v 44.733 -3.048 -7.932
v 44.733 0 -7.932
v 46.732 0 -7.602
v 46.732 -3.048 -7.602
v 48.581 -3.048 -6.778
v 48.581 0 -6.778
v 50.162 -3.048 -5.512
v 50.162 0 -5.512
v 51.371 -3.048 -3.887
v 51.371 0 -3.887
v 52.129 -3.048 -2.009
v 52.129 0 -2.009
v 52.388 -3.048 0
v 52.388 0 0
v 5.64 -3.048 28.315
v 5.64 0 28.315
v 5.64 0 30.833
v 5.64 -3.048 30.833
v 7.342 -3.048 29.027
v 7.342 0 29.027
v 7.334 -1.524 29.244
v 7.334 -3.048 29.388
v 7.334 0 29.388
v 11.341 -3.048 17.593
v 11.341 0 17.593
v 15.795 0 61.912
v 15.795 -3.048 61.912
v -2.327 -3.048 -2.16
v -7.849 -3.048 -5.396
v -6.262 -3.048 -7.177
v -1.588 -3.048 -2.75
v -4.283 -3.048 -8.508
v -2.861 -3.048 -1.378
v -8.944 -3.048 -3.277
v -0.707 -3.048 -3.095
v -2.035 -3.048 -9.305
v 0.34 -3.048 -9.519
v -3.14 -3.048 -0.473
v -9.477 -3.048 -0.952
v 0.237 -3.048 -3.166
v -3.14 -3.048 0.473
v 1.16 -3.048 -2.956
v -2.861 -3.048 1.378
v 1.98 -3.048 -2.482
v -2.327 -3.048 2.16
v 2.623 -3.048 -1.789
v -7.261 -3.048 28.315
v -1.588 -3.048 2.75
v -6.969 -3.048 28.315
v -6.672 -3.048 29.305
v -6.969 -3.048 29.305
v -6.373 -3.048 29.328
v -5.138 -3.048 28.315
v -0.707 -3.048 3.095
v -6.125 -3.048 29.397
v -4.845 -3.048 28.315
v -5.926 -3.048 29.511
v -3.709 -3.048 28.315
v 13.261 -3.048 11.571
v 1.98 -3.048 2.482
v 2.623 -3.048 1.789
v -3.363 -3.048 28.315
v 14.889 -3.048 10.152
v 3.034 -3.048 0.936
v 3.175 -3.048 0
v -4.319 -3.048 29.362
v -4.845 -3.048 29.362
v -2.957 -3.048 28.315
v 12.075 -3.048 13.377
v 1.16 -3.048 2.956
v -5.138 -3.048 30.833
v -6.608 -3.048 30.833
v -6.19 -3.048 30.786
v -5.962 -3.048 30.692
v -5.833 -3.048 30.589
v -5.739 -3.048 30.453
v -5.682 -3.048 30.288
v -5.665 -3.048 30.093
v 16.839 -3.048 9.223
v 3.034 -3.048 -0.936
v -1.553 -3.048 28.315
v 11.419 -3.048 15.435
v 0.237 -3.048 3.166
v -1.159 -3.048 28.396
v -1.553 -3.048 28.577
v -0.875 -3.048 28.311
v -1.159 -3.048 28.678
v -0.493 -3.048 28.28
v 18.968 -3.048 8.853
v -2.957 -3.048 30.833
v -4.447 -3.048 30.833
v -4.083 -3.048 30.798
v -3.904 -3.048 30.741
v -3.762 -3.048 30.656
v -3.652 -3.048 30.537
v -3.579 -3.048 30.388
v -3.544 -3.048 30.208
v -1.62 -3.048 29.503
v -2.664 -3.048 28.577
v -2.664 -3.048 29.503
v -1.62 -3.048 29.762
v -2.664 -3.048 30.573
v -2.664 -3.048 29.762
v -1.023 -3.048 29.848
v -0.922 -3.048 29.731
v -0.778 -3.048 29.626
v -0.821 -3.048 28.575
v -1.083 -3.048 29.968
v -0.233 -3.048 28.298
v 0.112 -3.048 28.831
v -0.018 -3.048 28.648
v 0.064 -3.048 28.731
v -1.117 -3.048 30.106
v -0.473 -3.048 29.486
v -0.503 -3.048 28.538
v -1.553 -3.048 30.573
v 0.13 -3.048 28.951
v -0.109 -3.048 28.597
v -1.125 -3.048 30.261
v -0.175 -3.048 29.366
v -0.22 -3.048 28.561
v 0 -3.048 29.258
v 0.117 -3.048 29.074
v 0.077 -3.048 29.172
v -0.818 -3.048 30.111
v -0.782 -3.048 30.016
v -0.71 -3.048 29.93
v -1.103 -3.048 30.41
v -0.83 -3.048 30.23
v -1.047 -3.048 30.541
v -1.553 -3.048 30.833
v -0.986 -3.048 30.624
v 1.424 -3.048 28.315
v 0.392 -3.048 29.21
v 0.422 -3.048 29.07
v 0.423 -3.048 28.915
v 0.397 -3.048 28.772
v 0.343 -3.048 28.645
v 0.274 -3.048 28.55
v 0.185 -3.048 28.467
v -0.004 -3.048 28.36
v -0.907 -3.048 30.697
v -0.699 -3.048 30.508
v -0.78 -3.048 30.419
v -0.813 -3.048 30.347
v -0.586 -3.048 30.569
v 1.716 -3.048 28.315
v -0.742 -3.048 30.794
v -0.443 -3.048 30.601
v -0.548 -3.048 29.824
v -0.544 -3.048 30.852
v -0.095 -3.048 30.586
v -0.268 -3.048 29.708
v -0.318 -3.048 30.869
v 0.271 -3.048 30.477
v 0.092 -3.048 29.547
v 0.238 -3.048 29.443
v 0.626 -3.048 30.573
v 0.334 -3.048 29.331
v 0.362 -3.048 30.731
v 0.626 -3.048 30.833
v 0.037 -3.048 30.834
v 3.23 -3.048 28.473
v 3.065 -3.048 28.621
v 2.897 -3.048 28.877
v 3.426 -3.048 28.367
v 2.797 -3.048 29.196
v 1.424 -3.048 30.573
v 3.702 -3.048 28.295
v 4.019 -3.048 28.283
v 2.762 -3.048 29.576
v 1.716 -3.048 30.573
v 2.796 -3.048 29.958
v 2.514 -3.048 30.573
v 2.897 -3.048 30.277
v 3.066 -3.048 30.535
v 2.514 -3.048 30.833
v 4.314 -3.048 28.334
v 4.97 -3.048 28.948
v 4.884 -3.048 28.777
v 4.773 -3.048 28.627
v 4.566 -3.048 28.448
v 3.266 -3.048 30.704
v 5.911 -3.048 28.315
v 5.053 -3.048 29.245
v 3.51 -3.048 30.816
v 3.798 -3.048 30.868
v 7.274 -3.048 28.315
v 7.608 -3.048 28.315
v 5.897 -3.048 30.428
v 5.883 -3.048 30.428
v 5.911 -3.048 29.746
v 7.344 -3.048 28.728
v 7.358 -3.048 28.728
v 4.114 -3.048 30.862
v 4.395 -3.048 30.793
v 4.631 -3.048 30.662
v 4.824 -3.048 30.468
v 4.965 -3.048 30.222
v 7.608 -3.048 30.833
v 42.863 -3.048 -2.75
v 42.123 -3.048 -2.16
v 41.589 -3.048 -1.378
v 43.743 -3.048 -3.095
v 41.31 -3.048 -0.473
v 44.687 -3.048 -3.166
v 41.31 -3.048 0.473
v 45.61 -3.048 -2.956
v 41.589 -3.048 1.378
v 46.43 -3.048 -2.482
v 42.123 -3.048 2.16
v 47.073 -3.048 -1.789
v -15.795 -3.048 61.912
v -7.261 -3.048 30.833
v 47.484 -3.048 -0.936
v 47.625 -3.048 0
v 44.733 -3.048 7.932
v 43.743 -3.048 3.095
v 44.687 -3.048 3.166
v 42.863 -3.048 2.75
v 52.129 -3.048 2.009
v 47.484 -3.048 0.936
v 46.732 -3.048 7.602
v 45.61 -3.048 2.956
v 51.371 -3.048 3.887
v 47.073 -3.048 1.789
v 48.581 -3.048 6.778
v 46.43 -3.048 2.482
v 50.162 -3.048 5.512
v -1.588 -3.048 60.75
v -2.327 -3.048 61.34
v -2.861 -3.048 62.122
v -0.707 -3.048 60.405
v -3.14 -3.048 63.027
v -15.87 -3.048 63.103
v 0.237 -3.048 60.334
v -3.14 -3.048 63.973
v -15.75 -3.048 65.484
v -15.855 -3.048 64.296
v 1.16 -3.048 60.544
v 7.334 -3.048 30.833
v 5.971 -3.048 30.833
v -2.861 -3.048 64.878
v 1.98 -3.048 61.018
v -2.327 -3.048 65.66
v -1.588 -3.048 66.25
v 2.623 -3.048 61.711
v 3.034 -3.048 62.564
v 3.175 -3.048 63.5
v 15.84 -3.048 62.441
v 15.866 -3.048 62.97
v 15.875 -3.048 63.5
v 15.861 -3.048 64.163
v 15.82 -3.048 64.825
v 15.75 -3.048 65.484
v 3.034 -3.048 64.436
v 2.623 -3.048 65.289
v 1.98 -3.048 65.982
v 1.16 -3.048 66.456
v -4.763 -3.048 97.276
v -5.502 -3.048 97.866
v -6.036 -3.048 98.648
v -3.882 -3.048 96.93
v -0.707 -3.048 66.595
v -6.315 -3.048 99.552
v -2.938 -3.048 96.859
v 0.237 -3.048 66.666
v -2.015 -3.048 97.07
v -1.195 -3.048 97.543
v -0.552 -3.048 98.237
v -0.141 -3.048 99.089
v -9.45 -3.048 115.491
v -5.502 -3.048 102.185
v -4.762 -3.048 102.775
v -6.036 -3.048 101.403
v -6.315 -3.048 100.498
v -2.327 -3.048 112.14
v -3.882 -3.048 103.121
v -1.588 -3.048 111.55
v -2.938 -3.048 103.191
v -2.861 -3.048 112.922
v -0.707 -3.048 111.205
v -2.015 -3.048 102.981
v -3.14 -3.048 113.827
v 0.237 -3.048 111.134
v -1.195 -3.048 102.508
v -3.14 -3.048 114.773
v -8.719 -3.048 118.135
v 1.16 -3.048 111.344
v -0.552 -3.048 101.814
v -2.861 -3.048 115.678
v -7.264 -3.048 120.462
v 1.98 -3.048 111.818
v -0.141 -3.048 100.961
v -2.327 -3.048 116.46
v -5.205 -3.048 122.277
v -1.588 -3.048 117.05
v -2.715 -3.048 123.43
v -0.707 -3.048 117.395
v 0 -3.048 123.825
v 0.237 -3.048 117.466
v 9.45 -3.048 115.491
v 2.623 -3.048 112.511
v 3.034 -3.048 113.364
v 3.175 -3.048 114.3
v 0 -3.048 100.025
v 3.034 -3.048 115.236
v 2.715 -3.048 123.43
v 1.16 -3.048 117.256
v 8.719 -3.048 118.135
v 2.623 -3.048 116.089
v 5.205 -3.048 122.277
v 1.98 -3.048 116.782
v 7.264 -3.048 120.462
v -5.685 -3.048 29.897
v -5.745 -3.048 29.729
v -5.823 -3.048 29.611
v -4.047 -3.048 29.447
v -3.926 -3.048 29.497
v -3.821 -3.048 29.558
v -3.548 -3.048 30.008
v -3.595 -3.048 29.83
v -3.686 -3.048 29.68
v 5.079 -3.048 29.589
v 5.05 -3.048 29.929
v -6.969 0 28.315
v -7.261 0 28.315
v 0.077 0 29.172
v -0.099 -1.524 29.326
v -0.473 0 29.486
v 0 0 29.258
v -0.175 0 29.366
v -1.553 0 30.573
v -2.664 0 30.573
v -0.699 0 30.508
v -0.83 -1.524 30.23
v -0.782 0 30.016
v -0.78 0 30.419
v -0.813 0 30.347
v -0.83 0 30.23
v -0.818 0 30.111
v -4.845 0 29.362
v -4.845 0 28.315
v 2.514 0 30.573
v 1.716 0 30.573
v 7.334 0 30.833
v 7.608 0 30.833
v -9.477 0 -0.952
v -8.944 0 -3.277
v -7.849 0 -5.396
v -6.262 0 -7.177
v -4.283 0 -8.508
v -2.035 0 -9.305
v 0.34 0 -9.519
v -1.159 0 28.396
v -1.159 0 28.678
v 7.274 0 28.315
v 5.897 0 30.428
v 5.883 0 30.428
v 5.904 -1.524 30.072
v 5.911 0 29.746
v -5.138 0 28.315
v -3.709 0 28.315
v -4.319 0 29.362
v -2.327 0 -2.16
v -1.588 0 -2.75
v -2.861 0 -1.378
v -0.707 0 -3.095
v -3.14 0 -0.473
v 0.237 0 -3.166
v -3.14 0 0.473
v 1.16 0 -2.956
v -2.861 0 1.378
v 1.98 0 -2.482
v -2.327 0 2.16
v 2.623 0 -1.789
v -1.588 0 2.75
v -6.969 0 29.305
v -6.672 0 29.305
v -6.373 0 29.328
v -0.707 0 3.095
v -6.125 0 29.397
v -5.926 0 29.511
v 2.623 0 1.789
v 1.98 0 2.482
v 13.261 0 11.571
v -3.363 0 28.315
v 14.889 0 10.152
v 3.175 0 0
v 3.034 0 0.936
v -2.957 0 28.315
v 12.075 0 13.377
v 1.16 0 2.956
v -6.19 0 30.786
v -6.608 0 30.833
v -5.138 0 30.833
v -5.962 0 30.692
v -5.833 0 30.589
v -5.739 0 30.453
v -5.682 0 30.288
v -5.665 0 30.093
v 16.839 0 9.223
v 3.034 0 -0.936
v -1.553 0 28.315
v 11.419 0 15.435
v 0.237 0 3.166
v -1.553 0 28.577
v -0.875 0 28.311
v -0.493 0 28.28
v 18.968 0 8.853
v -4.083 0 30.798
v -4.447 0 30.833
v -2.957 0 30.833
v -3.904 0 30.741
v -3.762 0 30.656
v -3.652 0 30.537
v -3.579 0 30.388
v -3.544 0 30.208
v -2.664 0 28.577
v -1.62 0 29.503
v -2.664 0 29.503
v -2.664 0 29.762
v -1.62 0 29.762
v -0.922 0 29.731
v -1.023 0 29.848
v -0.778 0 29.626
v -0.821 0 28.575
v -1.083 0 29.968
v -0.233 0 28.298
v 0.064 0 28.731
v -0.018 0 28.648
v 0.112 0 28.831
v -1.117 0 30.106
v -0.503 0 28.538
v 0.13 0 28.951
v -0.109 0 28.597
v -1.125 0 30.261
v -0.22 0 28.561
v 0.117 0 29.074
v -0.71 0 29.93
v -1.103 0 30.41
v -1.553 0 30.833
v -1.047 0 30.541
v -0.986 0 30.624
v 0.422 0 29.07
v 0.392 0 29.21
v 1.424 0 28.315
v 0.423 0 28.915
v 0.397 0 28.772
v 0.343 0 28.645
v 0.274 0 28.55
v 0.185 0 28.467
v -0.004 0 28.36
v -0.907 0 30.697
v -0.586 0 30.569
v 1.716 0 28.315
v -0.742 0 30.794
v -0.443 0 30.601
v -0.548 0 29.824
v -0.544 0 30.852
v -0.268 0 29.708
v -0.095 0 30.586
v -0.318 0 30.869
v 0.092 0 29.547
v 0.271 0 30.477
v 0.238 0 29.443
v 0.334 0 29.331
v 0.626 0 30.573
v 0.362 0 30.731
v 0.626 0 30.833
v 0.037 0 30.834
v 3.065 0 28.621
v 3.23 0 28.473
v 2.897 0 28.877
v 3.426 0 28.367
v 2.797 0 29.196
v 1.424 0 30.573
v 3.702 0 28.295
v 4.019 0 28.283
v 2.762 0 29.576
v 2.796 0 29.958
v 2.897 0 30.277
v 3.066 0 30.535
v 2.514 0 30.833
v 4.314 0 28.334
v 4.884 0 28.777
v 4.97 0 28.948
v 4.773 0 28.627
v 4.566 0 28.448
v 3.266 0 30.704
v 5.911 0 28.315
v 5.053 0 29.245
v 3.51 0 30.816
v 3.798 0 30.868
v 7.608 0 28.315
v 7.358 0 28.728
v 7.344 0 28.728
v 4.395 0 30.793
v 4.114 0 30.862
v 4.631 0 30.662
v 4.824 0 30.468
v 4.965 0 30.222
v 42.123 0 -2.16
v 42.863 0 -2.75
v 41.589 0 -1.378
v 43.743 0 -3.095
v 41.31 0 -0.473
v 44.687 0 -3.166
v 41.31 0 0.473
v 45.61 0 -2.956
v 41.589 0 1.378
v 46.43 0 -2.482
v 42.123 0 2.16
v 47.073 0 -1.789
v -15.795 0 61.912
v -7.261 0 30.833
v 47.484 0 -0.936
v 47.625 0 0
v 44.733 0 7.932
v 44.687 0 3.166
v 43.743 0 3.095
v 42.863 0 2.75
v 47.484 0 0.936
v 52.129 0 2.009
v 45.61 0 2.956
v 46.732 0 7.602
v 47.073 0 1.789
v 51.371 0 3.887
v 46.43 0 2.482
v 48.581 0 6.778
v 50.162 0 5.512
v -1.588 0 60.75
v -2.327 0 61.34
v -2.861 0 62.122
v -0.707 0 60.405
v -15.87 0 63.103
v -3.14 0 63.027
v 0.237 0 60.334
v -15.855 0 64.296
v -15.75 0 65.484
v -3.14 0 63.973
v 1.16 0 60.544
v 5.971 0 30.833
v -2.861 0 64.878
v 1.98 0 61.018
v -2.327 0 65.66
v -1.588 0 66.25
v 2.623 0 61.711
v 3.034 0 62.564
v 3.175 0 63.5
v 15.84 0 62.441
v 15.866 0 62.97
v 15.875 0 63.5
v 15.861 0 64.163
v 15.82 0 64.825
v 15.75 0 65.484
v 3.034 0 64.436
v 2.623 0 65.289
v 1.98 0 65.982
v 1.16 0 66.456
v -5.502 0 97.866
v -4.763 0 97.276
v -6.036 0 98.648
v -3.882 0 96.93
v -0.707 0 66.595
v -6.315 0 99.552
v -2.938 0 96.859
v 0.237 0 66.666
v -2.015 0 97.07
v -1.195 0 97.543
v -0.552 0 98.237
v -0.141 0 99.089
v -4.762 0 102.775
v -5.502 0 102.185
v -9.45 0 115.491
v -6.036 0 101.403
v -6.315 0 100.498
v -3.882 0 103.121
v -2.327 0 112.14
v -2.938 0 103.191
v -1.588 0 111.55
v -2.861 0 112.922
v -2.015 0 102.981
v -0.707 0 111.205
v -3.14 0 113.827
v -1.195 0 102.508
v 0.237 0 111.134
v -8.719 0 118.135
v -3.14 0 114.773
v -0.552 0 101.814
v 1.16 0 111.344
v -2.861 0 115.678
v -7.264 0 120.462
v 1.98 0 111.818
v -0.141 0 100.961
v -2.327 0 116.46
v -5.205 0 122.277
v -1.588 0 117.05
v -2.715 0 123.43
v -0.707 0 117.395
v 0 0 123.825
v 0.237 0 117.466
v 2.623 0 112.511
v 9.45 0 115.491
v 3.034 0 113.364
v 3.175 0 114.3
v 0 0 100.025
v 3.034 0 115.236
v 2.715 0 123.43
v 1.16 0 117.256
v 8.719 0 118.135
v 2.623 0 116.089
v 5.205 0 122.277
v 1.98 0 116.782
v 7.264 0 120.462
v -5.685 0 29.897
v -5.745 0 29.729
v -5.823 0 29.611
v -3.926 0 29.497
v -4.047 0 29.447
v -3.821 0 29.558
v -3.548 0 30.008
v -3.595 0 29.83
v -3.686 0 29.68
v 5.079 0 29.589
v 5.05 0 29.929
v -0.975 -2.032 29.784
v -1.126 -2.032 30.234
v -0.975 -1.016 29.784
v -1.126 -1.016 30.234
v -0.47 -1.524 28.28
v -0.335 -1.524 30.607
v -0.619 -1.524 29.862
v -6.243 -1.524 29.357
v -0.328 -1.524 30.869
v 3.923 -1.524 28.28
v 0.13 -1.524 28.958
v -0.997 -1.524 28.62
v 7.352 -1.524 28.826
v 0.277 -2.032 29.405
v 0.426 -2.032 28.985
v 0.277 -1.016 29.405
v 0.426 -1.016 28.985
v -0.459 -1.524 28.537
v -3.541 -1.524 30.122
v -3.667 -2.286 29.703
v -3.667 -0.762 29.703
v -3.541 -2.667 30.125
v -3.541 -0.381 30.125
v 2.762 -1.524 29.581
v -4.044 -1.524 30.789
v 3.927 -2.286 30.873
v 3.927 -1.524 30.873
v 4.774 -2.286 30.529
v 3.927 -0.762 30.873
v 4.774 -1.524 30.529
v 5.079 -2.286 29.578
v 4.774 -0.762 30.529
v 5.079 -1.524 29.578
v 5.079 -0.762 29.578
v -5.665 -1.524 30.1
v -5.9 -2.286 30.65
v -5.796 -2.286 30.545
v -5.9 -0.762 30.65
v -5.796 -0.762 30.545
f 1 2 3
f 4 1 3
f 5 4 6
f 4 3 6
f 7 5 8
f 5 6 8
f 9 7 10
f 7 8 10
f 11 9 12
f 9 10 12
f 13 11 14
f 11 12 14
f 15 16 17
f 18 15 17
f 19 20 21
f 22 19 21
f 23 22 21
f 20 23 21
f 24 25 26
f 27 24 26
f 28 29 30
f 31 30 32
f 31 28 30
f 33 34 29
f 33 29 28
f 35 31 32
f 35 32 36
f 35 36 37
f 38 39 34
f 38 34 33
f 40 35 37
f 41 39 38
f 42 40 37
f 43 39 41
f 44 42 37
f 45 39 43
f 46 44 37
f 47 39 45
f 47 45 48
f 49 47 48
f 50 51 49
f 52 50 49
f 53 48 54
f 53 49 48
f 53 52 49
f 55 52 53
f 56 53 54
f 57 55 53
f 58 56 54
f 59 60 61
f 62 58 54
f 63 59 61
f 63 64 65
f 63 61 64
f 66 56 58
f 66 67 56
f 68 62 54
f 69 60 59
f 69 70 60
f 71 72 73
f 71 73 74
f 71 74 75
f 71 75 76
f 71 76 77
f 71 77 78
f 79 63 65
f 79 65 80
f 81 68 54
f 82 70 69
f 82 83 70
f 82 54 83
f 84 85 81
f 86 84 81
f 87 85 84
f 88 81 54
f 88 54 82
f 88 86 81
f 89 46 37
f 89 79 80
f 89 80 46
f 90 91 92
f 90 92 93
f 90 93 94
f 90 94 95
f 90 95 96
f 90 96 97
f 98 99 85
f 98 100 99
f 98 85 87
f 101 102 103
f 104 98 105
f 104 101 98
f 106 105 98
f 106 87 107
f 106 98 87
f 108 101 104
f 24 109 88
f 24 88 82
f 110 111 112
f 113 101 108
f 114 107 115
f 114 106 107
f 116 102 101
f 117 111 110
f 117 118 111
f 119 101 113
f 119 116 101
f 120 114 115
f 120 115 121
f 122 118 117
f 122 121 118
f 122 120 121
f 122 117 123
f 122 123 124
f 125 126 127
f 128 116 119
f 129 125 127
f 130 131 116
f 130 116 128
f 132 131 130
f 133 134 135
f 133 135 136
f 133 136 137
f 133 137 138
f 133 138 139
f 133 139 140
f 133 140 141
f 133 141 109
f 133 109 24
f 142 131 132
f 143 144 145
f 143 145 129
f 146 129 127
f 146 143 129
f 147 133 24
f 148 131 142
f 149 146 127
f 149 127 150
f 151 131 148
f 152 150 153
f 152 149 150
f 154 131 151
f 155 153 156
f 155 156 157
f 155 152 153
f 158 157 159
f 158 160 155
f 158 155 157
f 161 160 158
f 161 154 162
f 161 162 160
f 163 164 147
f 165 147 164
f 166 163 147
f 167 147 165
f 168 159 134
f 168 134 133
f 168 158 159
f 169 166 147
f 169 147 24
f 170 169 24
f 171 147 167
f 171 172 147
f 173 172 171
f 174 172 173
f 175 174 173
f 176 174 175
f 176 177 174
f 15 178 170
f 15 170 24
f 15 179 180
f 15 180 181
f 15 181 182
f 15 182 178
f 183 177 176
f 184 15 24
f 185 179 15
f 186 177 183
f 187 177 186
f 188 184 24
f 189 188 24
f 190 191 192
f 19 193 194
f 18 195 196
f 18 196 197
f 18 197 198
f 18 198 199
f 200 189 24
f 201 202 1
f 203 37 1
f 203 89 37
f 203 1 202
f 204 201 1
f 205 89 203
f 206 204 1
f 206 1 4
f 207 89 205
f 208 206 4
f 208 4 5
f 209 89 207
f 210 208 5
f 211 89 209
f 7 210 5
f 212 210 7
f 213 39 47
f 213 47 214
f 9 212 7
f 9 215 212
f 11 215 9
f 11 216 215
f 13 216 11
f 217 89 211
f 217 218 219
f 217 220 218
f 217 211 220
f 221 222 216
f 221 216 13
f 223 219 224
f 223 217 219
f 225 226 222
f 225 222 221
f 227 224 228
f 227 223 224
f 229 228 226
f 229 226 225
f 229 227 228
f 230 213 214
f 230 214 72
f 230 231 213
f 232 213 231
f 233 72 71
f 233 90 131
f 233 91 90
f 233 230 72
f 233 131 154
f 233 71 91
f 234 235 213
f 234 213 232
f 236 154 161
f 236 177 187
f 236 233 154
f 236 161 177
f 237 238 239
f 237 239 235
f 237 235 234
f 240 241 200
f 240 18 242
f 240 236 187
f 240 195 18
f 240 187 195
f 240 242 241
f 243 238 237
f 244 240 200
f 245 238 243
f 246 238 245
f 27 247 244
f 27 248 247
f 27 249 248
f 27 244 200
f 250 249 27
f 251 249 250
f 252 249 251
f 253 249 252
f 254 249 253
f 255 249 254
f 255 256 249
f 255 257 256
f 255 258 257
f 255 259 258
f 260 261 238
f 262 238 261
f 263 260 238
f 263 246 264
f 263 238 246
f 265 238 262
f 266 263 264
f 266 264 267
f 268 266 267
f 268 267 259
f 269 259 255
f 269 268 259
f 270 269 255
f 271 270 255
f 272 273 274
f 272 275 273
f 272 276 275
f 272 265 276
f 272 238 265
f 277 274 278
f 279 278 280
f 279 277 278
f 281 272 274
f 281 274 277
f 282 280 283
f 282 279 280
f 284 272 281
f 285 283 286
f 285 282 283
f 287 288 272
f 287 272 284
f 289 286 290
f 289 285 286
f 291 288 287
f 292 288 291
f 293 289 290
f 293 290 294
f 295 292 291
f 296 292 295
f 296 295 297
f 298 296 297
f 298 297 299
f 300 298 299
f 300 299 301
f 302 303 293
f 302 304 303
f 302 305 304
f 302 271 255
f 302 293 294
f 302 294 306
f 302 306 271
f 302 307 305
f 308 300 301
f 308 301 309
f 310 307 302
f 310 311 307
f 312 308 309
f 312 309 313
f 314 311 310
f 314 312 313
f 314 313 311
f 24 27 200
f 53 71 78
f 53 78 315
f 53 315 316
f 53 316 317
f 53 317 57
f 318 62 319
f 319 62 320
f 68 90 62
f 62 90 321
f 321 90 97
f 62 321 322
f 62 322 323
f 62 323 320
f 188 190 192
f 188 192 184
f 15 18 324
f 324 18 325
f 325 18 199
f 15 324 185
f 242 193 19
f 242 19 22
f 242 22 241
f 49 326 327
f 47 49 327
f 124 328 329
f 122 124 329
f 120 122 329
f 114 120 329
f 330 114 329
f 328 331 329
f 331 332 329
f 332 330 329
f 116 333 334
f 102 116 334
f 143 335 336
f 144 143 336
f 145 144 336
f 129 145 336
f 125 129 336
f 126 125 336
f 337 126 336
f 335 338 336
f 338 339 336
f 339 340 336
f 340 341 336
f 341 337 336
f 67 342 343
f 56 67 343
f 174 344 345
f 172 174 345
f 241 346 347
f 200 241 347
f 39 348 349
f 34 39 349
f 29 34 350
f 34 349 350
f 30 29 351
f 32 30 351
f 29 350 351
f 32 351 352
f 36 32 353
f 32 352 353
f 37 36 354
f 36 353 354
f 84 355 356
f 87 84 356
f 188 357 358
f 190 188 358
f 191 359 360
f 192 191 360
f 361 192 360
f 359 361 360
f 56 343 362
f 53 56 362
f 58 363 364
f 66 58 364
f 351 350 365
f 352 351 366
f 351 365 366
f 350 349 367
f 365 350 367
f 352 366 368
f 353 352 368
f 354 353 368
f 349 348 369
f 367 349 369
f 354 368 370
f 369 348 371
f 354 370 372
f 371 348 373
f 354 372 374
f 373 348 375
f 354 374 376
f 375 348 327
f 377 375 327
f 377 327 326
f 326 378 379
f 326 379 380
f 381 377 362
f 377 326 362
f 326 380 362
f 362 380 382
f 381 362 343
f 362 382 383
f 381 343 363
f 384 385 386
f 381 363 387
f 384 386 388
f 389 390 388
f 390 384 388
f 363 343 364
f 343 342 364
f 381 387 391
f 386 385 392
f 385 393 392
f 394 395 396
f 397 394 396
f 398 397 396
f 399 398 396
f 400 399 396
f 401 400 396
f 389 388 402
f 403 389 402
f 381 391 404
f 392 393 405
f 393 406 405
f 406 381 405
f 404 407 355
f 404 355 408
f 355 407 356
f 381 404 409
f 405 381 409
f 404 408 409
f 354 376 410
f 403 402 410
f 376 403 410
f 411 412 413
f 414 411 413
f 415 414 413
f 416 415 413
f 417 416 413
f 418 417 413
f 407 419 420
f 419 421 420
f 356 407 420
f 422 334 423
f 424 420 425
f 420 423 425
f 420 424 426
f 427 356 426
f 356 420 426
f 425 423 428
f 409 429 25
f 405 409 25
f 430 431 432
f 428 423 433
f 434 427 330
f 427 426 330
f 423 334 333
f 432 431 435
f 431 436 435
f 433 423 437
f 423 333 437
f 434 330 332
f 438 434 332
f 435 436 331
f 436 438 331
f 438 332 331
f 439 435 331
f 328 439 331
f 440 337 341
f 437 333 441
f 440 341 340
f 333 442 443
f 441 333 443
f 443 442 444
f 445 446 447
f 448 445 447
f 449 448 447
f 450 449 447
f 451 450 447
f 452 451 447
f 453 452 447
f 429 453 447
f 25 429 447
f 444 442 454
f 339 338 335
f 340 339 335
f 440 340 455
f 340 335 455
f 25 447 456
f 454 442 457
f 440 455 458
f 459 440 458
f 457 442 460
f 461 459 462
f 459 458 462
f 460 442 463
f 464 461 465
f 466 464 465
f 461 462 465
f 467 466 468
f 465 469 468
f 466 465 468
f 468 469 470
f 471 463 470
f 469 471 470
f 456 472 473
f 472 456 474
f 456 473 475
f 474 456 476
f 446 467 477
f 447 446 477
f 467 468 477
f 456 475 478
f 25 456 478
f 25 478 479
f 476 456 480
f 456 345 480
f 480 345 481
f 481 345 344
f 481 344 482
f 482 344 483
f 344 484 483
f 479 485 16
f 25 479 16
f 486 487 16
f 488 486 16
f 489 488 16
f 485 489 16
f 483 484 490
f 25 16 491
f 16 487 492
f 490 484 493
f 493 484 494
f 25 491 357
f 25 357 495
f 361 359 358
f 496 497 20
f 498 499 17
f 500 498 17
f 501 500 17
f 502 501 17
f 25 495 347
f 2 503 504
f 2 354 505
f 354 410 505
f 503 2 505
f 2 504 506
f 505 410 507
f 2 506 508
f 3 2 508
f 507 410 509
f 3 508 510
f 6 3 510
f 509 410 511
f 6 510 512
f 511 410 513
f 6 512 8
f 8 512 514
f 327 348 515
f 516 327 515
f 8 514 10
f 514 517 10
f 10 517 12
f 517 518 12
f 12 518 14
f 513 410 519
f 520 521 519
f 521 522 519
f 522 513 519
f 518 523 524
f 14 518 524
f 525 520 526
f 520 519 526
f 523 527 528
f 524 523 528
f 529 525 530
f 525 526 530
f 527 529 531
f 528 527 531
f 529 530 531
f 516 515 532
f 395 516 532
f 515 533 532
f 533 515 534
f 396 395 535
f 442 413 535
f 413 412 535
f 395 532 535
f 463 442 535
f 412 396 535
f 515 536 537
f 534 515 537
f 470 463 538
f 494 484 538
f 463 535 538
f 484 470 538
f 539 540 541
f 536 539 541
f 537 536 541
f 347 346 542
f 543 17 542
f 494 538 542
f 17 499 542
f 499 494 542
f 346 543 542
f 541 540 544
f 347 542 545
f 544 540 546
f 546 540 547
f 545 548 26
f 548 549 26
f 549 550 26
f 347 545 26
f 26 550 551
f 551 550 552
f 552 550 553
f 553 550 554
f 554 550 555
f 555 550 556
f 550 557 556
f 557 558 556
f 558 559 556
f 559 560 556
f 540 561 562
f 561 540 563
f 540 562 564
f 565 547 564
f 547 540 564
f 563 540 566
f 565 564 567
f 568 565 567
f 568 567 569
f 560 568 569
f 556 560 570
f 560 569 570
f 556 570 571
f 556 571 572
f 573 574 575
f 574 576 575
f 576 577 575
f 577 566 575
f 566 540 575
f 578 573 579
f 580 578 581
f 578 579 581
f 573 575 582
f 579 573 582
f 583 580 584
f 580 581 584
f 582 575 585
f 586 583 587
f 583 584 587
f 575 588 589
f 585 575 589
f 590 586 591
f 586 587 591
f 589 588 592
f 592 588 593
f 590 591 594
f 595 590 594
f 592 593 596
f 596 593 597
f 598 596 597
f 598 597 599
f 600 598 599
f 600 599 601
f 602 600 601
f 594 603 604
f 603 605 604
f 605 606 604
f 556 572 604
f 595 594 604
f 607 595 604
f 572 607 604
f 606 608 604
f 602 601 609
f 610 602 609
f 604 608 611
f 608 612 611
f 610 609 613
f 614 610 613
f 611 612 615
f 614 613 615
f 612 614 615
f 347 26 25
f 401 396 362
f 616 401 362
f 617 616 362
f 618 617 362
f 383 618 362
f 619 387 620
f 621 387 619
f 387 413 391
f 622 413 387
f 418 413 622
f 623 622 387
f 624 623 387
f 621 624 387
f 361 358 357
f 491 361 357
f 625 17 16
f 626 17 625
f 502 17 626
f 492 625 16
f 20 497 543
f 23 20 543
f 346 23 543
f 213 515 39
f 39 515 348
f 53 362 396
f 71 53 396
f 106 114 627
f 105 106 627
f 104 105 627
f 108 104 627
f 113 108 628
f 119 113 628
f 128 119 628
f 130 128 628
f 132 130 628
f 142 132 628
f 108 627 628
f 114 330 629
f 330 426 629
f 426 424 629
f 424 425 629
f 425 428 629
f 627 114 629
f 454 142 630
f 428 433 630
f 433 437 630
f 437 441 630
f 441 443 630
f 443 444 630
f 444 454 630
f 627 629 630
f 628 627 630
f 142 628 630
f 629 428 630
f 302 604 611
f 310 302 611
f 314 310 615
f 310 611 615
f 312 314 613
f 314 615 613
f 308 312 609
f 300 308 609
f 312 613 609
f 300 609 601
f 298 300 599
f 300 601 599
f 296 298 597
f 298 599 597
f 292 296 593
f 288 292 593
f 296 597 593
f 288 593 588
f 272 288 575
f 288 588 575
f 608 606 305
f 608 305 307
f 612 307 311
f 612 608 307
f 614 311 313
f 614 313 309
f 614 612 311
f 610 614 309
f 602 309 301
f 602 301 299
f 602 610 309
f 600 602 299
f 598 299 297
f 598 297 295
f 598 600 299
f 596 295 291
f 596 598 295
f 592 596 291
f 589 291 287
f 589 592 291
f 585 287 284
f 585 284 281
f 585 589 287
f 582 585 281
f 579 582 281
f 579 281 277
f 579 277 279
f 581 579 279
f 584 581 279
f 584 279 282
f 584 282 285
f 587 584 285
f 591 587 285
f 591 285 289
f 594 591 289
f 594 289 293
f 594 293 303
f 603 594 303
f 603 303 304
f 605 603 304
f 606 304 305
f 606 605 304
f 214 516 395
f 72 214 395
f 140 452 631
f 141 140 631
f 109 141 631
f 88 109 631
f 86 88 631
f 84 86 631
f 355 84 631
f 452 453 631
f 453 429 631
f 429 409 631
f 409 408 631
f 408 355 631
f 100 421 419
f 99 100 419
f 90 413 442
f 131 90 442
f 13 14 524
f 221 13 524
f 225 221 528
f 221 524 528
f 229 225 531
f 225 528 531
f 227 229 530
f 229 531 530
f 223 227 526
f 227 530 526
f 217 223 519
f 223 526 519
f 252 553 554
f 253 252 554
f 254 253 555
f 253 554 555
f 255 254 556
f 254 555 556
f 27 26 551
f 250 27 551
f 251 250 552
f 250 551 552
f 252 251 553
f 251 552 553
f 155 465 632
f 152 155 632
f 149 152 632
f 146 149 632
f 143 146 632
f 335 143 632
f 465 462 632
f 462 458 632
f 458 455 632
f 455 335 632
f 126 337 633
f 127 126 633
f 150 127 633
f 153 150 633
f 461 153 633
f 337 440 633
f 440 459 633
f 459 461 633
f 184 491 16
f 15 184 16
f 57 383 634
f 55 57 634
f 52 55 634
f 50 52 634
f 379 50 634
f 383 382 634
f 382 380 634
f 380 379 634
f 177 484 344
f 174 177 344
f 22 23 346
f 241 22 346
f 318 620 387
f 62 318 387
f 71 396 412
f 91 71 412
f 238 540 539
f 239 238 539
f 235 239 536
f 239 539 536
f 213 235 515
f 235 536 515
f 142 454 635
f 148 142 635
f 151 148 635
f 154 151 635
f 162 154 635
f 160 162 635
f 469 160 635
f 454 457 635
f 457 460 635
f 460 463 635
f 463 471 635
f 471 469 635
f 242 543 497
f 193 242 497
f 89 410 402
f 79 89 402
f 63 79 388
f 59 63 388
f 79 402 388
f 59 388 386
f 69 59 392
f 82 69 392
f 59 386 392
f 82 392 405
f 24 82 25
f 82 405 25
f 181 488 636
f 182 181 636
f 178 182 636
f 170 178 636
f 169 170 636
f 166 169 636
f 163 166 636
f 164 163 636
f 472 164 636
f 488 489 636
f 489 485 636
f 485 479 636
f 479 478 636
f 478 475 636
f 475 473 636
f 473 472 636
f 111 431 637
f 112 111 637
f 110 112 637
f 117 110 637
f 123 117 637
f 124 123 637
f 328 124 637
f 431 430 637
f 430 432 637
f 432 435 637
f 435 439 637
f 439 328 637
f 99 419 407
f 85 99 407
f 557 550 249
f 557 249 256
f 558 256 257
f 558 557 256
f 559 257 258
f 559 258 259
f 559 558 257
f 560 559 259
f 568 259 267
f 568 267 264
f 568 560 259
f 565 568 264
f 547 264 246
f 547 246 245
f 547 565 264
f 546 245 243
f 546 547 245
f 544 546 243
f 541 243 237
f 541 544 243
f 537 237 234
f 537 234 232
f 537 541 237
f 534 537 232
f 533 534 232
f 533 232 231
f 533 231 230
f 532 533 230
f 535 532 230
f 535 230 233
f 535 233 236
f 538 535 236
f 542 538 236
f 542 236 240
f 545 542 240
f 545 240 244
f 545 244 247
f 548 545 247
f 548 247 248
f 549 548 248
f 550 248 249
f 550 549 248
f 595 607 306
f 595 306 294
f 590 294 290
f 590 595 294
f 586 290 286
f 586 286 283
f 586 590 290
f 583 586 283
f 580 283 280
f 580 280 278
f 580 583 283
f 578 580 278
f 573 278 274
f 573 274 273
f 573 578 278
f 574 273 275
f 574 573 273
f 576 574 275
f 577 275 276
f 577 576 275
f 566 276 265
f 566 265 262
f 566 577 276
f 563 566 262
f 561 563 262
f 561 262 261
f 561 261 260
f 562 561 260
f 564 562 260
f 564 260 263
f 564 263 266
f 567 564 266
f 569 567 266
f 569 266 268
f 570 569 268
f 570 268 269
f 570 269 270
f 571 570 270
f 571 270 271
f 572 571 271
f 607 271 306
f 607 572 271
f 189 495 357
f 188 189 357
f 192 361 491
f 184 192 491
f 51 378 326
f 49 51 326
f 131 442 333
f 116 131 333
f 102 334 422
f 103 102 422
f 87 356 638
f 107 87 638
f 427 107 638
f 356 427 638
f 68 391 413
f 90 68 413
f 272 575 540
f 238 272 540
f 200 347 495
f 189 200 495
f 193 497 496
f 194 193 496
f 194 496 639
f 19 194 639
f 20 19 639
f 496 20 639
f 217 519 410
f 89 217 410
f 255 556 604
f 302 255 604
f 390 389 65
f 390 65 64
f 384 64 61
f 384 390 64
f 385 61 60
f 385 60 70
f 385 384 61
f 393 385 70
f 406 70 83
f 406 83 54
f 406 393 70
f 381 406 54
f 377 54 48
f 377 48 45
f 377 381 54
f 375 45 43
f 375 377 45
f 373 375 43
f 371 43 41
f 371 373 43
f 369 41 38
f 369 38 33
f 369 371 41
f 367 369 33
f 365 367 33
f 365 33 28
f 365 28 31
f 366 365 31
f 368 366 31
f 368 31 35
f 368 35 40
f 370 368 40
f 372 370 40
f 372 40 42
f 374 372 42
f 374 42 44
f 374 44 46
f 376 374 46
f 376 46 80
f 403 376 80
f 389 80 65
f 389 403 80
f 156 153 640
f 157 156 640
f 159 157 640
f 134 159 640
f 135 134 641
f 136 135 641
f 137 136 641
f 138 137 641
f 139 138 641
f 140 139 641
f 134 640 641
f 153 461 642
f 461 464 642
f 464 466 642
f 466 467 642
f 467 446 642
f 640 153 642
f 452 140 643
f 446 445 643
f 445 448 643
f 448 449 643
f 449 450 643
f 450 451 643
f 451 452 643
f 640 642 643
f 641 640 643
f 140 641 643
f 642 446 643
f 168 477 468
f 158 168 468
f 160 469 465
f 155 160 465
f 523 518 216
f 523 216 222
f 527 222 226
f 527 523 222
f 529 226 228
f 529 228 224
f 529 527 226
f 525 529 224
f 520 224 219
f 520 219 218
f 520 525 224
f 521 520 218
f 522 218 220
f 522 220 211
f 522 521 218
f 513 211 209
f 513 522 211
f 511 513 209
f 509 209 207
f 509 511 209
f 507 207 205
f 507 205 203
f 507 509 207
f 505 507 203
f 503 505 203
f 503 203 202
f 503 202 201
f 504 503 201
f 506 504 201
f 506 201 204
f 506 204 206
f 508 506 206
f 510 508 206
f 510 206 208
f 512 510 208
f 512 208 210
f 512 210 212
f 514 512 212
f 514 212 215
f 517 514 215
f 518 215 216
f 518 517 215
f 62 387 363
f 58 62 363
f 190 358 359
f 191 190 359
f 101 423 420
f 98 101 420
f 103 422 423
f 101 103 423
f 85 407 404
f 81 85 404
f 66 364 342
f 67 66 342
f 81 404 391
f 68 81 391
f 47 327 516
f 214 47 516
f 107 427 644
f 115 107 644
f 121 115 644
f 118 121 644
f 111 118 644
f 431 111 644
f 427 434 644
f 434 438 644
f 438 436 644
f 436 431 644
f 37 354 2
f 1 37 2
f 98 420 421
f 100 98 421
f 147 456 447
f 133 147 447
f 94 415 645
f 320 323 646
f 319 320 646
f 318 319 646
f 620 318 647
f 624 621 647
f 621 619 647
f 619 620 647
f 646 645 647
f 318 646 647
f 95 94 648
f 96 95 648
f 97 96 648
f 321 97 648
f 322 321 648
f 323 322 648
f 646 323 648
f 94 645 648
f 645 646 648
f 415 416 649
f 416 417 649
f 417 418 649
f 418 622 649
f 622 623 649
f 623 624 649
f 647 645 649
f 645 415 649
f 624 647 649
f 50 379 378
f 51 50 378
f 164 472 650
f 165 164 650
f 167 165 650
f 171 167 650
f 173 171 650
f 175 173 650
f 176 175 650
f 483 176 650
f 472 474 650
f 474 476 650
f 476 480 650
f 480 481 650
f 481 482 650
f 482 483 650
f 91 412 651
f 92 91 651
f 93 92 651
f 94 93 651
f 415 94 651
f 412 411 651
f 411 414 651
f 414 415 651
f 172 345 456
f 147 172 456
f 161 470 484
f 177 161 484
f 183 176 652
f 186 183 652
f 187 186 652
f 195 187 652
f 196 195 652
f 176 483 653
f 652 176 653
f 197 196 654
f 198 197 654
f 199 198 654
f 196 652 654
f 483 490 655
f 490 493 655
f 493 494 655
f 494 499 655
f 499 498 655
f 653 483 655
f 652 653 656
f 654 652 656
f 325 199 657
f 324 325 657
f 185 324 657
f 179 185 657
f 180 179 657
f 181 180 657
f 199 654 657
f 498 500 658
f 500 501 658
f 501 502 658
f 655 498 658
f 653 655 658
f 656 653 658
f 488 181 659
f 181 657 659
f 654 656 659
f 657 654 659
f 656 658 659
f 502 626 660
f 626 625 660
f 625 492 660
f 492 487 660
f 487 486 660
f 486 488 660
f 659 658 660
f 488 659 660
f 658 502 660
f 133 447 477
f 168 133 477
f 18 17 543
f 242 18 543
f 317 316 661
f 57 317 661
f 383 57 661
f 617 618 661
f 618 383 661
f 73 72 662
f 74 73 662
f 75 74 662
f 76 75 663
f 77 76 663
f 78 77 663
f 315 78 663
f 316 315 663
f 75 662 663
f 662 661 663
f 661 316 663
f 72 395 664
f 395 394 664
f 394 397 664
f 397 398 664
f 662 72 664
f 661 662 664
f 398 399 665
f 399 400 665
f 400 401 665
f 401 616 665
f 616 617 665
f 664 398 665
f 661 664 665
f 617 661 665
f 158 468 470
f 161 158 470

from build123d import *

# Parameters (mm, degrees)
F0_R     = 3.175
F1_DEPTH = 3.048


with BuildPart() as f1:
    # F0 (on Front) → F1 (new body)
    with BuildSketch(Plane.XZ):
        with BuildLine():
            ThreePointArc((-9.4502929642, 115.490625), (-0.596483242, 104.7936951058), (9.525, 114.3))
            ThreePointArc((9.525, 114.3), (9.5063048942, 114.896483242), (9.4502929642, 115.490625))
            ThreePointArc((9.4502929642, 115.490625), (0, 123.825), (-9.4502929642, 115.490625))
        make_face()
        with Locations((0, 114.3)):
            Circle(F0_R, mode=Mode.SUBTRACT)
        with BuildLine():
            ThreePointArc((9.4502929642, 115.490625), (9.5063048942, 114.896483242), (9.525, 114.3))
            ThreePointArc((9.525, 114.3), (-0.596483242, 104.7936951058), (-9.4502929642, 115.490625))
            Line((-9.4502929642, 115.490625), (-15.7504882737, 65.484375))
            ThreePointArc((-15.7504882737, 65.484375), (0, 79.375), (15.7504882737, 65.484375))
            Line((15.7504882737, 65.484375), (9.4502929642, 115.490625))
        make_face()
        with Locations((-3.175, 100.0252)):
            Circle(F0_R, mode=Mode.SUBTRACT)
        with BuildLine():
            ThreePointArc((15.875, 63.5), (15.8438414904, 64.4941387366), (15.7504882737, 65.484375))
            ThreePointArc((15.7504882737, 65.484375), (0, 79.375), (-15.7504882737, 65.484375))
            ThreePointArc((-15.7504882737, 65.484375), (-15.8737438155, 63.6997054867), (-15.7954255641, 61.9125))
            ThreePointArc((-15.7954255641, 61.9125), (0, 47.625), (15.7954255641, 61.9125))
            ThreePointArc((15.7954255641, 61.9125), (15.8550939106, 62.7052534459), (15.875, 63.5))
        make_face()
        with Locations((0, 63.5)):
            Circle(F0_R, mode=Mode.SUBTRACT)
        with BuildLine():
            ThreePointArc((15.7954255641, 61.9125), (0, 47.625), (-15.7954255641, 61.9125))
            Line((-15.7954255641, 61.9125), (-9.4772553384, -0.9525))
            ThreePointArc((-9.4772553384, -0.9525), (-0.4768479324, 9.5130563464), (9.525, 0))
            ThreePointArc((9.525, 0), (6.8544082857, -6.6138273378), (0.3401785714, -9.5189234444))
            Line((0.3401785714, -9.5189234444), (44.7334821429, -7.9324362036))
            ThreePointArc((44.7334821429, -7.9324362036), (36.5125, 0), (44.7334821429, 7.9324362036))
            Line((44.7334821429, 7.9324362036), (18.9676000005, 8.8532337108))
            ThreePointArc((18.9676000005, 8.8532337108), (13.2611998974, 11.5713591498), (11.3411865923, 17.5933818124))
            Line((11.3411865923, 17.5933818124), (15.7954255641, 61.9125))
        make_face()
        with BuildLine():
            add(Edge.make_bspline(
                [(-6.6082443576, 30.833461862), (-5.6645638021, 30.833461862), (-5.6645638021, 30.0997943273)],
                knots=[0, 0, 0, 1, 1, 1], degree=2))
            add(Edge.make_bspline(
                [(-5.6645638021, 30.0997943273), (-5.6645638021, 29.7172509245), (-5.9255642361, 29.5113720183)],
                knots=[0, 0, 0, 1, 1, 1], degree=2))
            add(Edge.make_bspline(
                [(-5.9255642361, 29.5113720183), (-6.1865646701, 29.305493112), (-6.6721853299, 29.305493112)],
                knots=[0, 0, 0, 1, 1, 1], degree=2))
            Line((-6.6721853299, 29.305493112), (-6.9687391493, 29.305493112))
            Line((-6.9687391493, 29.305493112), (-6.9687391493, 28.3149592578))
            Line((-6.9687391493, 28.3149592578), (-7.2614344618, 28.3149592578))
            Line((-7.2614344618, 28.3149592578), (-7.2614344618, 30.833461862))
            Line((-7.2614344618, 30.833461862), (-6.6082443576, 30.833461862))
        make_face(mode=Mode.SUBTRACT)
        with BuildLine():
            Line((-4.319047309, 29.3622682856), (-4.844906684, 29.3622682856))
            Line((-4.844906684, 29.3622682856), (-4.844906684, 28.3149592578))
            Line((-4.844906684, 28.3149592578), (-5.1376019965, 28.3149592578))
            Line((-5.1376019965, 28.3149592578), (-5.1376019965, 30.833461862))
            Line((-5.1376019965, 30.833461862), (-4.4469292535, 30.833461862))
            add(Edge.make_bspline(
                [(-4.4469292535, 30.833461862), (-3.9833572049, 30.833461862), (-3.7620442708, 30.6559705426)],
                knots=[0, 0, 0, 1, 1, 1], degree=2))
            add(Edge.make_bspline(
                [(-3.7620442708, 30.6559705426), (-3.5407313368, 30.4784792231), (-3.5407313368, 30.1218429384)],
                knots=[0, 0, 0, 1, 1, 1], degree=2))
            add(Edge.make_bspline(
                [(-3.5407313368, 30.1218429384), (-3.5407313368, 29.6224418967), (-4.0472981771, 29.4466042231)],
                knots=[0, 0, 0, 1, 1, 1], degree=2))
            Line((-4.0472981771, 29.4466042231), (-3.3632400174, 28.3149592578))
            Line((-3.3632400174, 28.3149592578), (-3.7094032118, 28.3149592578))
            Line((-3.7094032118, 28.3149592578), (-4.319047309, 29.3622682856))
        make_face(mode=Mode.SUBTRACT)
        Polygon((-1.5530490451, 28.5767865148), (-1.5530490451, 28.3149592578), (-2.9569943576, 28.3149592578), (-2.9569943576, 30.833461862), (-1.5530490451, 30.833461862), (-1.5530490451, 30.5732882509), (-2.6642990451, 30.5732882509), (-2.6642990451, 29.761899362), (-1.620297309, 29.761899362), (-1.620297309, 29.5033793967), (-2.6642990451, 29.5033793967), (-2.6642990451, 28.5767865148), align=None, mode=Mode.SUBTRACT)
        with BuildLine():
            add(Edge.make_bspline(
                [(0.2769856771, 29.4052630773), (0.4258138021, 29.2432057856), (0.4258138021, 28.9852370356)],
                knots=[0, 0, 0, 1, 1, 1], degree=2))
            add(Edge.make_bspline(
                [(0.4258138021, 28.9852370356), (0.4258138021, 28.6528542231), (0.1846571181, 28.4665434592)],
                knots=[0, 0, 0, 1, 1, 1], degree=2))
            add(Edge.make_bspline(
                [(0.1846571181, 28.4665434592), (-0.056499566, 28.2802326953), (-0.4699110243, 28.2802326953)],
                knots=[0, 0, 0, 1, 1, 1], degree=2))
            add(Edge.make_bspline(
                [(-0.4699110243, 28.2802326953), (-0.9174978299, 28.2802326953), (-1.1589301215, 28.3959879037)],
                knots=[0, 0, 0, 1, 1, 1], degree=2))
            Line((-1.1589301215, 28.3959879037), (-1.1589301215, 28.6782101259))
            add(Edge.make_bspline(
                [(-1.1589301215, 28.6782101259), (-1.0034874132, 28.6131667231), (-0.8210351562, 28.575132869)],
                knots=[0, 0, 0, 1, 1, 1], degree=2))
            add(Edge.make_bspline(
                [(-0.8210351562, 28.575132869), (-0.6385828993, 28.5370990148), (-0.459437934, 28.5370990148)],
                knots=[0, 0, 0, 1, 1, 1], degree=2))
            add(Edge.make_bspline(
                [(-0.459437934, 28.5370990148), (-0.1667426215, 28.5370990148), (-0.0184657118, 28.6481688933)],
                knots=[0, 0, 0, 1, 1, 1], degree=2))
            add(Edge.make_bspline(
                [(-0.0184657118, 28.6481688933), (0.1298111979, 28.7592387717), (0.1298111979, 28.9576762717)],
                knots=[0, 0, 0, 1, 1, 1], degree=2))
            add(Edge.make_bspline(
                [(0.1298111979, 28.9576762717), (0.1298111979, 29.0883142926), (0.0771701389, 29.1718234071)],
                knots=[0, 0, 0, 1, 1, 1], degree=2))
            add(Edge.make_bspline(
                [(0.0771701389, 29.1718234071), (0.0245290799, 29.2553325217), (-0.0986675347, 29.3261636849)],
                knots=[0, 0, 0, 1, 1, 1], degree=2))
            add(Edge.make_bspline(
                [(-0.0986675347, 29.3261636849), (-0.2218641493, 29.3969948481), (-0.473218316, 29.4862917231)],
                knots=[0, 0, 0, 1, 1, 1], degree=2))
            add(Edge.make_bspline(
                [(-0.473218316, 29.4862917231), (-0.8243424479, 29.6119688065), (-0.9750998264, 29.7842235808)],
                knots=[0, 0, 0, 1, 1, 1], degree=2))
            add(Edge.make_bspline(
                [(-0.9750998264, 29.7842235808), (-1.1258572049, 29.9564783551), (-1.1258572049, 30.2337396398)],
                knots=[0, 0, 0, 1, 1, 1], degree=2))
            add(Edge.make_bspline(
                [(-1.1258572049, 30.2337396398), (-1.1258572049, 30.5247813065), (-0.9073003472, 30.6970360808)],
                knots=[0, 0, 0, 1, 1, 1], degree=2))
            add(Edge.make_bspline(
                [(-0.9073003472, 30.6970360808), (-0.6887434896, 30.8692908551), (-0.3282486979, 30.8692908551)],
                knots=[0, 0, 0, 1, 1, 1], degree=2))
            add(Edge.make_bspline(
                [(-0.3282486979, 30.8692908551), (0.0471289063, 30.8692908551), (0.3624240451, 30.7314870356)],
                knots=[0, 0, 0, 1, 1, 1], degree=2))
            Line((0.3624240451, 30.7314870356), (0.270922309, 30.4768255773))
            add(Edge.make_bspline(
                [(0.270922309, 30.4768255773), (-0.0410655382, 30.6074635981), (-0.3354144965, 30.6074635981)],
                knots=[0, 0, 0, 1, 1, 1], degree=2))
            add(Edge.make_bspline(
                [(-0.3354144965, 30.6074635981), (-0.5680273437, 30.6074635981), (-0.6989409722, 30.5076936328)],
                knots=[0, 0, 0, 1, 1, 1], degree=2))
            add(Edge.make_bspline(
                [(-0.6989409722, 30.5076936328), (-0.8298546007, 30.4079236676), (-0.8298546007, 30.2304323481)],
                knots=[0, 0, 0, 1, 1, 1], degree=2))
            add(Edge.make_bspline(
                [(-0.8298546007, 30.2304323481), (-0.8298546007, 30.0997943273), (-0.7816232639, 30.0160096051)],
                knots=[0, 0, 0, 1, 1, 1], degree=2))
            add(Edge.make_bspline(
                [(-0.7816232639, 30.0160096051), (-0.7333919271, 29.9322248828), (-0.6187391493, 29.8624961502)],
                knots=[0, 0, 0, 1, 1, 1], degree=2))
            add(Edge.make_bspline(
                [(-0.6187391493, 29.8624961502), (-0.5040863715, 29.7927674176), (-0.2681662326, 29.7084314801)],
                knots=[0, 0, 0, 1, 1, 1], degree=2))
            add(Edge.make_bspline(
                [(-0.2681662326, 29.7084314801), (0.1281575521, 29.567320369), (0.2769856771, 29.4052630773)],
                knots=[0, 0, 0, 1, 1, 1], degree=2))
        make_face(mode=Mode.SUBTRACT)
        Polygon((1.7162087674, 30.5732882509), (1.7162087674, 28.3149592578), (1.4235134549, 28.3149592578), (1.4235134549, 30.5732882509), (0.6259049479, 30.5732882509), (0.6259049479, 30.833461862), (2.5138172743, 30.833461862), (2.5138172743, 30.5732882509), align=None, mode=Mode.SUBTRACT)
        with BuildLine():
            add(Edge.make_bspline(
                [(4.7743511285, 30.5286398134), (5.0791731771, 30.1841302648), (5.0791731771, 29.5777934592)],
                knots=[0, 0, 0, 1, 1, 1], degree=2))
            add(Edge.make_bspline(
                [(5.0791731771, 29.5777934592), (5.0791731771, 28.9731102995), (4.7732486979, 28.6266714974)],
                knots=[0, 0, 0, 1, 1, 1], degree=2))
            add(Edge.make_bspline(
                [(4.7732486979, 28.6266714974), (4.4673242188, 28.2802326953), (3.9232747396, 28.2802326953)],
                knots=[0, 0, 0, 1, 1, 1], degree=2))
            add(Edge.make_bspline(
                [(3.9232747396, 28.2802326953), (3.3670985243, 28.2802326953), (3.0647569444, 28.6206081294)],
                knots=[0, 0, 0, 1, 1, 1], degree=2))
            add(Edge.make_bspline(
                [(3.0647569444, 28.6206081294), (2.7624153646, 28.9609835634), (2.7624153646, 29.5811007509)],
                knots=[0, 0, 0, 1, 1, 1], degree=2))
            add(Edge.make_bspline(
                [(2.7624153646, 29.5811007509), (2.7624153646, 30.1962570009), (3.0655837674, 30.5347031815)],
                knots=[0, 0, 0, 1, 1, 1], degree=2))
            add(Edge.make_bspline(
                [(3.0655837674, 30.5347031815), (3.3687521701, 30.873149362), (3.9265820313, 30.873149362)],
                knots=[0, 0, 0, 1, 1, 1], degree=2))
            add(Edge.make_bspline(
                [(3.9265820313, 30.873149362), (4.4695290799, 30.873149362), (4.7743511285, 30.5286398134)],
                knots=[0, 0, 0, 1, 1, 1], degree=2))
        make_face(mode=Mode.SUBTRACT)
        with BuildLine():
            Line((7.6075976563, 30.833461862), (7.6075976563, 28.3149592578))
            Line((7.6075976563, 28.3149592578), (7.2735611979, 28.3149592578))
            Line((7.2735611979, 28.3149592578), (5.8971766493, 30.4283186328))
            Line((5.8971766493, 30.4283186328), (5.8833962674, 30.4283186328))
            add(Edge.make_bspline(
                [(5.8833962674, 30.4283186328), (5.9109570313, 30.0562483203), (5.9109570313, 29.7464653342)],
                knots=[0, 0, 0, 1, 1, 1], degree=2))
            Line((5.9109570313, 29.7464653342), (5.9109570313, 28.3149592578))
            Line((5.9109570313, 28.3149592578), (5.6403103299, 28.3149592578))
            Line((5.6403103299, 28.3149592578), (5.6403103299, 30.833461862))
            Line((5.6403103299, 30.833461862), (5.9710394965, 30.833461862))
            Line((5.9710394965, 30.833461862), (7.3441167535, 28.7283707162))
            Line((7.3441167535, 28.7283707162), (7.3578971354, 28.7283707162))
            add(Edge.make_bspline(
                [(7.3578971354, 28.7283707162), (7.3545898438, 28.7746727995), (7.3424631076, 29.0271293967)],
                knots=[0, 0, 0, 1, 1, 1], degree=2))
            add(Edge.make_bspline(
                [(7.3424631076, 29.0271293967), (7.3303363715, 29.279585994), (7.3336436632, 29.3881754037)],
                knots=[0, 0, 0, 1, 1, 1], degree=2))
            Line((7.3336436632, 29.3881754037), (7.3336436632, 30.833461862))
            Line((7.3336436632, 30.833461862), (7.6075976563, 30.833461862))
        make_face(mode=Mode.SUBTRACT)
        with BuildLine():
            ThreePointArc((9.525, 0), (-0.4768479324, 9.5130563464), (-9.4772553384, -0.9525))
            ThreePointArc((-9.4772553384, -0.9525), (-6.2623833816, -7.1769199091), (0.3401785714, -9.5189234444))
            ThreePointArc((0.3401785714, -9.5189234444), (6.8544082857, -6.6138273378), (9.525, 0))
        make_face()
        Circle(F0_R, mode=Mode.SUBTRACT)
        with BuildLine():
            ThreePointArc((44.7334821429, 7.9324362036), (36.5125, 0), (44.7334821429, -7.9324362036))
            ThreePointArc((44.7334821429, -7.9324362036), (50.1620069047, -5.5115227815), (52.3875, 0))
            ThreePointArc((52.3875, 0), (50.1620069047, 5.5115227815), (44.7334821429, 7.9324362036))
        make_face()
        with Locations((44.45, 0)):
            Circle(F0_R, mode=Mode.SUBTRACT)
    extrude(amount=F1_DEPTH)


solid = f1.part
